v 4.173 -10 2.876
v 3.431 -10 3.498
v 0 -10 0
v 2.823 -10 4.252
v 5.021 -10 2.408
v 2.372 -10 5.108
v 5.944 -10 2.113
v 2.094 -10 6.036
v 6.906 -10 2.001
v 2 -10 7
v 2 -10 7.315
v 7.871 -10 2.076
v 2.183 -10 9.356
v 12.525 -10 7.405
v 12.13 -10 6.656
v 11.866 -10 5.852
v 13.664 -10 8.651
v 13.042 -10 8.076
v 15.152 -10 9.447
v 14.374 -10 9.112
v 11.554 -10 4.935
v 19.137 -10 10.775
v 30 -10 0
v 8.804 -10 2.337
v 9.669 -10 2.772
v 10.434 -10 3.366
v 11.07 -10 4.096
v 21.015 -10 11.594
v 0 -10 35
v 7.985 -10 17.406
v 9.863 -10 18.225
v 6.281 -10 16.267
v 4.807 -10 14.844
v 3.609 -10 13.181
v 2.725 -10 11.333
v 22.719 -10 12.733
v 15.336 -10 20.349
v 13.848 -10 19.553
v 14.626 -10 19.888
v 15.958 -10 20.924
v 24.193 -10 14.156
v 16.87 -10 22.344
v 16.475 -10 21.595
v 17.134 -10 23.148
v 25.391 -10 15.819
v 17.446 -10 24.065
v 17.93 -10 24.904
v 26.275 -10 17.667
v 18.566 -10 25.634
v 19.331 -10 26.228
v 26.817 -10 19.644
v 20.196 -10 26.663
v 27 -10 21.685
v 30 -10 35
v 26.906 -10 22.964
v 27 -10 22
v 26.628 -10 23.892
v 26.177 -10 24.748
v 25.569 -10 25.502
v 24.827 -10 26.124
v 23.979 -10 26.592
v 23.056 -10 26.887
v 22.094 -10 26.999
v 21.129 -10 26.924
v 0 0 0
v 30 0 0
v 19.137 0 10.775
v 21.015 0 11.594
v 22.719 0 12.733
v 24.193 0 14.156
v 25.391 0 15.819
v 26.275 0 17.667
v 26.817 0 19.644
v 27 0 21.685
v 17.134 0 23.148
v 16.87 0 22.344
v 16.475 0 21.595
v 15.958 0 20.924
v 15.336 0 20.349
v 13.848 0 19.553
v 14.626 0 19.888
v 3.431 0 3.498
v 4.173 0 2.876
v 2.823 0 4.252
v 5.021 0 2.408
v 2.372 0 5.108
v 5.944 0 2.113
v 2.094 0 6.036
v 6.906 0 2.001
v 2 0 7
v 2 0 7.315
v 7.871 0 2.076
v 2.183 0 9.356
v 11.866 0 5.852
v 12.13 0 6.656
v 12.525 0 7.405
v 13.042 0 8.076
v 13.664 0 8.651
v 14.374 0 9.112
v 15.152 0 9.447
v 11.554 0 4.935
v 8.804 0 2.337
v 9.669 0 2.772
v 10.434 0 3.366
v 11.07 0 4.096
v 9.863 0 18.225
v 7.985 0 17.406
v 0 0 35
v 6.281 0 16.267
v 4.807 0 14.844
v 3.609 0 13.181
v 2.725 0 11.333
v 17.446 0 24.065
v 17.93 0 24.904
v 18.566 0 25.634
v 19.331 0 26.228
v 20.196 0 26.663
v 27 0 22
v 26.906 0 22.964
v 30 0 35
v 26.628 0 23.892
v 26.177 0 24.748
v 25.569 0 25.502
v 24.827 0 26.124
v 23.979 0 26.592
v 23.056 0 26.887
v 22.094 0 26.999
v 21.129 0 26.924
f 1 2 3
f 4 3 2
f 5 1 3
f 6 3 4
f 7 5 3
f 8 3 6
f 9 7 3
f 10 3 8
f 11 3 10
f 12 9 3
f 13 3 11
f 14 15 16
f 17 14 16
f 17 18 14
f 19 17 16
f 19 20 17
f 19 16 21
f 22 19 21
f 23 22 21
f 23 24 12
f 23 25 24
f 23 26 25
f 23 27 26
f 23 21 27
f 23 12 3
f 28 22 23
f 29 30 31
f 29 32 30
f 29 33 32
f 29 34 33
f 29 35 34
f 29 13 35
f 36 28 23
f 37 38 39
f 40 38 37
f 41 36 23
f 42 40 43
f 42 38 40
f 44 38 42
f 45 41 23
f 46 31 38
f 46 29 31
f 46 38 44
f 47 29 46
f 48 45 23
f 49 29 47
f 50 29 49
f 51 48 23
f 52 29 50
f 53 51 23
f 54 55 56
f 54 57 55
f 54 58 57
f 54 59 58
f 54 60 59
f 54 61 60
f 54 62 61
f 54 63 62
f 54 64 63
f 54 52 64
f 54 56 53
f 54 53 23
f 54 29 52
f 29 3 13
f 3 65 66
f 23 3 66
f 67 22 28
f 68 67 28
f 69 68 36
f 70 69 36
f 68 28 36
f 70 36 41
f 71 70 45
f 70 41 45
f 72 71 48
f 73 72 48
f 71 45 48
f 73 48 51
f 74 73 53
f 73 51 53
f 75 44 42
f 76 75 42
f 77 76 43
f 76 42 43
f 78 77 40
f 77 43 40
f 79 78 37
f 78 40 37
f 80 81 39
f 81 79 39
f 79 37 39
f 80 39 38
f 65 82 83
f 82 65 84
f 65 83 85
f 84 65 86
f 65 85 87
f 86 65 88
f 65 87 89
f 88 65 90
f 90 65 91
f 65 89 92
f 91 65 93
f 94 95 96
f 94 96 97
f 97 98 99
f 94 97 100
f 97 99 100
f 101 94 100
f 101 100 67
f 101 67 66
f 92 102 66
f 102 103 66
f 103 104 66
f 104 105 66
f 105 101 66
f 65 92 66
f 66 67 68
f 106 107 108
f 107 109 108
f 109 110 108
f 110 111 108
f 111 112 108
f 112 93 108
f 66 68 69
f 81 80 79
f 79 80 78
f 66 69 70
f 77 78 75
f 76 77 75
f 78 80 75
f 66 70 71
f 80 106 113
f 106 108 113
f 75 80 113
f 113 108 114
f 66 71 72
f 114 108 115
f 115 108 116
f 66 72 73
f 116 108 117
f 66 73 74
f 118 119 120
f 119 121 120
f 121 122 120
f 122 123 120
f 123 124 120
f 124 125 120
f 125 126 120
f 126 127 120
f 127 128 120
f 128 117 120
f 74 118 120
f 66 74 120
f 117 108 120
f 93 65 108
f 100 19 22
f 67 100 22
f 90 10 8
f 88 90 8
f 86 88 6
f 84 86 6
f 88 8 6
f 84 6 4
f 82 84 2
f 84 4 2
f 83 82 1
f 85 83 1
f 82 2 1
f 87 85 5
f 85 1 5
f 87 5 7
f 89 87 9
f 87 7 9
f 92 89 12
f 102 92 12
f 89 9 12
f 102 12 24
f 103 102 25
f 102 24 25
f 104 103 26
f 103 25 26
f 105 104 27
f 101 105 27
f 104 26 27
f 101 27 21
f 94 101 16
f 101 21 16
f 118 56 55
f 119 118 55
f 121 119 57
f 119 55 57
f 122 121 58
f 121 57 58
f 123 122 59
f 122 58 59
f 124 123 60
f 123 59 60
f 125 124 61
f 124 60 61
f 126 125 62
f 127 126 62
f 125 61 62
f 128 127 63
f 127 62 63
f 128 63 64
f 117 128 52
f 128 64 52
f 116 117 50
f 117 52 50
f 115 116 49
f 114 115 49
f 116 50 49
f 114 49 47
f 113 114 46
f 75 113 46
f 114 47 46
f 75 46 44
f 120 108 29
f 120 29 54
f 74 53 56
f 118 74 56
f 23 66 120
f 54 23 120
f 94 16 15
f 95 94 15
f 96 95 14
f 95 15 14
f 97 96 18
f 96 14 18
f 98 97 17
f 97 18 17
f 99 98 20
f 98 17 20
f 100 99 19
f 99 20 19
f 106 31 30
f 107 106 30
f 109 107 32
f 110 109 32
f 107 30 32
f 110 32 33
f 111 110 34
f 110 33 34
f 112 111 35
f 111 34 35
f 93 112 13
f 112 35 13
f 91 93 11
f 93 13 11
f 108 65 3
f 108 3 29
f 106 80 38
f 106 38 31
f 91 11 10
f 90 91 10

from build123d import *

# Parameters (mm, degrees)
F0_W     = 30
F0_H     = 35
F1_DEPTH = 10
F3_DEPTH = 10.001


# Not quite as in the source:
# - ends of sketch curves that miss each other by under 0.0002 mm in the source are joined


with BuildPart() as f1:
    # F0 (on Front) → F1 (new body)
    with BuildSketch(Plane.XZ):
        with Locations((15, 17.5)):
            Rectangle(F0_W, F0_H)
    extrude(amount=F1_DEPTH)

    # F2 (on face) → F3 (cut, through all)
    with BuildSketch(Plane.XZ.offset(10)):
        with BuildLine():
            Line((2.000000095, 7.3150651013), (2.000000095, 7))
            ThreePointArc((2.000000095, 7), (6.4219498037, 2.0335266063), (11.8663431882, 5.8516516319))
            ThreePointArc((11.8663431882, 5.8516516319), (13.0416655427, 8.0761900401), (15.1515475464, 9.4467197541))
            Line((15.1515475464, 9.4467197541), (19.1366200095, 10.7750772419))
            ThreePointArc((19.1366200095, 10.7750772419), (24.8292858299, 14.9607668958), (27.0000007004, 21.6849351694))
            Line((27.0000007004, 21.6849351694), (27.0000007004, 22))
            ThreePointArc((27.0000007004, 22), (22.5780501979, 26.9664733935), (17.1336568125, 23.1483483711))
            ThreePointArc((17.1336568125, 23.1483483711), (15.9583344576, 20.9238099649), (13.8484524551, 19.553280252))
            Line((13.8484524551, 19.553280252), (9.8633807858, 18.2249230289))
            ThreePointArc((9.8633807858, 18.2249230289), (4.1707149655, 14.0392333749), (2.000000095, 7.3150651013))
        make_face()
    extrude(amount=-F3_DEPTH, mode=Mode.SUBTRACT)


solid = f1.part
